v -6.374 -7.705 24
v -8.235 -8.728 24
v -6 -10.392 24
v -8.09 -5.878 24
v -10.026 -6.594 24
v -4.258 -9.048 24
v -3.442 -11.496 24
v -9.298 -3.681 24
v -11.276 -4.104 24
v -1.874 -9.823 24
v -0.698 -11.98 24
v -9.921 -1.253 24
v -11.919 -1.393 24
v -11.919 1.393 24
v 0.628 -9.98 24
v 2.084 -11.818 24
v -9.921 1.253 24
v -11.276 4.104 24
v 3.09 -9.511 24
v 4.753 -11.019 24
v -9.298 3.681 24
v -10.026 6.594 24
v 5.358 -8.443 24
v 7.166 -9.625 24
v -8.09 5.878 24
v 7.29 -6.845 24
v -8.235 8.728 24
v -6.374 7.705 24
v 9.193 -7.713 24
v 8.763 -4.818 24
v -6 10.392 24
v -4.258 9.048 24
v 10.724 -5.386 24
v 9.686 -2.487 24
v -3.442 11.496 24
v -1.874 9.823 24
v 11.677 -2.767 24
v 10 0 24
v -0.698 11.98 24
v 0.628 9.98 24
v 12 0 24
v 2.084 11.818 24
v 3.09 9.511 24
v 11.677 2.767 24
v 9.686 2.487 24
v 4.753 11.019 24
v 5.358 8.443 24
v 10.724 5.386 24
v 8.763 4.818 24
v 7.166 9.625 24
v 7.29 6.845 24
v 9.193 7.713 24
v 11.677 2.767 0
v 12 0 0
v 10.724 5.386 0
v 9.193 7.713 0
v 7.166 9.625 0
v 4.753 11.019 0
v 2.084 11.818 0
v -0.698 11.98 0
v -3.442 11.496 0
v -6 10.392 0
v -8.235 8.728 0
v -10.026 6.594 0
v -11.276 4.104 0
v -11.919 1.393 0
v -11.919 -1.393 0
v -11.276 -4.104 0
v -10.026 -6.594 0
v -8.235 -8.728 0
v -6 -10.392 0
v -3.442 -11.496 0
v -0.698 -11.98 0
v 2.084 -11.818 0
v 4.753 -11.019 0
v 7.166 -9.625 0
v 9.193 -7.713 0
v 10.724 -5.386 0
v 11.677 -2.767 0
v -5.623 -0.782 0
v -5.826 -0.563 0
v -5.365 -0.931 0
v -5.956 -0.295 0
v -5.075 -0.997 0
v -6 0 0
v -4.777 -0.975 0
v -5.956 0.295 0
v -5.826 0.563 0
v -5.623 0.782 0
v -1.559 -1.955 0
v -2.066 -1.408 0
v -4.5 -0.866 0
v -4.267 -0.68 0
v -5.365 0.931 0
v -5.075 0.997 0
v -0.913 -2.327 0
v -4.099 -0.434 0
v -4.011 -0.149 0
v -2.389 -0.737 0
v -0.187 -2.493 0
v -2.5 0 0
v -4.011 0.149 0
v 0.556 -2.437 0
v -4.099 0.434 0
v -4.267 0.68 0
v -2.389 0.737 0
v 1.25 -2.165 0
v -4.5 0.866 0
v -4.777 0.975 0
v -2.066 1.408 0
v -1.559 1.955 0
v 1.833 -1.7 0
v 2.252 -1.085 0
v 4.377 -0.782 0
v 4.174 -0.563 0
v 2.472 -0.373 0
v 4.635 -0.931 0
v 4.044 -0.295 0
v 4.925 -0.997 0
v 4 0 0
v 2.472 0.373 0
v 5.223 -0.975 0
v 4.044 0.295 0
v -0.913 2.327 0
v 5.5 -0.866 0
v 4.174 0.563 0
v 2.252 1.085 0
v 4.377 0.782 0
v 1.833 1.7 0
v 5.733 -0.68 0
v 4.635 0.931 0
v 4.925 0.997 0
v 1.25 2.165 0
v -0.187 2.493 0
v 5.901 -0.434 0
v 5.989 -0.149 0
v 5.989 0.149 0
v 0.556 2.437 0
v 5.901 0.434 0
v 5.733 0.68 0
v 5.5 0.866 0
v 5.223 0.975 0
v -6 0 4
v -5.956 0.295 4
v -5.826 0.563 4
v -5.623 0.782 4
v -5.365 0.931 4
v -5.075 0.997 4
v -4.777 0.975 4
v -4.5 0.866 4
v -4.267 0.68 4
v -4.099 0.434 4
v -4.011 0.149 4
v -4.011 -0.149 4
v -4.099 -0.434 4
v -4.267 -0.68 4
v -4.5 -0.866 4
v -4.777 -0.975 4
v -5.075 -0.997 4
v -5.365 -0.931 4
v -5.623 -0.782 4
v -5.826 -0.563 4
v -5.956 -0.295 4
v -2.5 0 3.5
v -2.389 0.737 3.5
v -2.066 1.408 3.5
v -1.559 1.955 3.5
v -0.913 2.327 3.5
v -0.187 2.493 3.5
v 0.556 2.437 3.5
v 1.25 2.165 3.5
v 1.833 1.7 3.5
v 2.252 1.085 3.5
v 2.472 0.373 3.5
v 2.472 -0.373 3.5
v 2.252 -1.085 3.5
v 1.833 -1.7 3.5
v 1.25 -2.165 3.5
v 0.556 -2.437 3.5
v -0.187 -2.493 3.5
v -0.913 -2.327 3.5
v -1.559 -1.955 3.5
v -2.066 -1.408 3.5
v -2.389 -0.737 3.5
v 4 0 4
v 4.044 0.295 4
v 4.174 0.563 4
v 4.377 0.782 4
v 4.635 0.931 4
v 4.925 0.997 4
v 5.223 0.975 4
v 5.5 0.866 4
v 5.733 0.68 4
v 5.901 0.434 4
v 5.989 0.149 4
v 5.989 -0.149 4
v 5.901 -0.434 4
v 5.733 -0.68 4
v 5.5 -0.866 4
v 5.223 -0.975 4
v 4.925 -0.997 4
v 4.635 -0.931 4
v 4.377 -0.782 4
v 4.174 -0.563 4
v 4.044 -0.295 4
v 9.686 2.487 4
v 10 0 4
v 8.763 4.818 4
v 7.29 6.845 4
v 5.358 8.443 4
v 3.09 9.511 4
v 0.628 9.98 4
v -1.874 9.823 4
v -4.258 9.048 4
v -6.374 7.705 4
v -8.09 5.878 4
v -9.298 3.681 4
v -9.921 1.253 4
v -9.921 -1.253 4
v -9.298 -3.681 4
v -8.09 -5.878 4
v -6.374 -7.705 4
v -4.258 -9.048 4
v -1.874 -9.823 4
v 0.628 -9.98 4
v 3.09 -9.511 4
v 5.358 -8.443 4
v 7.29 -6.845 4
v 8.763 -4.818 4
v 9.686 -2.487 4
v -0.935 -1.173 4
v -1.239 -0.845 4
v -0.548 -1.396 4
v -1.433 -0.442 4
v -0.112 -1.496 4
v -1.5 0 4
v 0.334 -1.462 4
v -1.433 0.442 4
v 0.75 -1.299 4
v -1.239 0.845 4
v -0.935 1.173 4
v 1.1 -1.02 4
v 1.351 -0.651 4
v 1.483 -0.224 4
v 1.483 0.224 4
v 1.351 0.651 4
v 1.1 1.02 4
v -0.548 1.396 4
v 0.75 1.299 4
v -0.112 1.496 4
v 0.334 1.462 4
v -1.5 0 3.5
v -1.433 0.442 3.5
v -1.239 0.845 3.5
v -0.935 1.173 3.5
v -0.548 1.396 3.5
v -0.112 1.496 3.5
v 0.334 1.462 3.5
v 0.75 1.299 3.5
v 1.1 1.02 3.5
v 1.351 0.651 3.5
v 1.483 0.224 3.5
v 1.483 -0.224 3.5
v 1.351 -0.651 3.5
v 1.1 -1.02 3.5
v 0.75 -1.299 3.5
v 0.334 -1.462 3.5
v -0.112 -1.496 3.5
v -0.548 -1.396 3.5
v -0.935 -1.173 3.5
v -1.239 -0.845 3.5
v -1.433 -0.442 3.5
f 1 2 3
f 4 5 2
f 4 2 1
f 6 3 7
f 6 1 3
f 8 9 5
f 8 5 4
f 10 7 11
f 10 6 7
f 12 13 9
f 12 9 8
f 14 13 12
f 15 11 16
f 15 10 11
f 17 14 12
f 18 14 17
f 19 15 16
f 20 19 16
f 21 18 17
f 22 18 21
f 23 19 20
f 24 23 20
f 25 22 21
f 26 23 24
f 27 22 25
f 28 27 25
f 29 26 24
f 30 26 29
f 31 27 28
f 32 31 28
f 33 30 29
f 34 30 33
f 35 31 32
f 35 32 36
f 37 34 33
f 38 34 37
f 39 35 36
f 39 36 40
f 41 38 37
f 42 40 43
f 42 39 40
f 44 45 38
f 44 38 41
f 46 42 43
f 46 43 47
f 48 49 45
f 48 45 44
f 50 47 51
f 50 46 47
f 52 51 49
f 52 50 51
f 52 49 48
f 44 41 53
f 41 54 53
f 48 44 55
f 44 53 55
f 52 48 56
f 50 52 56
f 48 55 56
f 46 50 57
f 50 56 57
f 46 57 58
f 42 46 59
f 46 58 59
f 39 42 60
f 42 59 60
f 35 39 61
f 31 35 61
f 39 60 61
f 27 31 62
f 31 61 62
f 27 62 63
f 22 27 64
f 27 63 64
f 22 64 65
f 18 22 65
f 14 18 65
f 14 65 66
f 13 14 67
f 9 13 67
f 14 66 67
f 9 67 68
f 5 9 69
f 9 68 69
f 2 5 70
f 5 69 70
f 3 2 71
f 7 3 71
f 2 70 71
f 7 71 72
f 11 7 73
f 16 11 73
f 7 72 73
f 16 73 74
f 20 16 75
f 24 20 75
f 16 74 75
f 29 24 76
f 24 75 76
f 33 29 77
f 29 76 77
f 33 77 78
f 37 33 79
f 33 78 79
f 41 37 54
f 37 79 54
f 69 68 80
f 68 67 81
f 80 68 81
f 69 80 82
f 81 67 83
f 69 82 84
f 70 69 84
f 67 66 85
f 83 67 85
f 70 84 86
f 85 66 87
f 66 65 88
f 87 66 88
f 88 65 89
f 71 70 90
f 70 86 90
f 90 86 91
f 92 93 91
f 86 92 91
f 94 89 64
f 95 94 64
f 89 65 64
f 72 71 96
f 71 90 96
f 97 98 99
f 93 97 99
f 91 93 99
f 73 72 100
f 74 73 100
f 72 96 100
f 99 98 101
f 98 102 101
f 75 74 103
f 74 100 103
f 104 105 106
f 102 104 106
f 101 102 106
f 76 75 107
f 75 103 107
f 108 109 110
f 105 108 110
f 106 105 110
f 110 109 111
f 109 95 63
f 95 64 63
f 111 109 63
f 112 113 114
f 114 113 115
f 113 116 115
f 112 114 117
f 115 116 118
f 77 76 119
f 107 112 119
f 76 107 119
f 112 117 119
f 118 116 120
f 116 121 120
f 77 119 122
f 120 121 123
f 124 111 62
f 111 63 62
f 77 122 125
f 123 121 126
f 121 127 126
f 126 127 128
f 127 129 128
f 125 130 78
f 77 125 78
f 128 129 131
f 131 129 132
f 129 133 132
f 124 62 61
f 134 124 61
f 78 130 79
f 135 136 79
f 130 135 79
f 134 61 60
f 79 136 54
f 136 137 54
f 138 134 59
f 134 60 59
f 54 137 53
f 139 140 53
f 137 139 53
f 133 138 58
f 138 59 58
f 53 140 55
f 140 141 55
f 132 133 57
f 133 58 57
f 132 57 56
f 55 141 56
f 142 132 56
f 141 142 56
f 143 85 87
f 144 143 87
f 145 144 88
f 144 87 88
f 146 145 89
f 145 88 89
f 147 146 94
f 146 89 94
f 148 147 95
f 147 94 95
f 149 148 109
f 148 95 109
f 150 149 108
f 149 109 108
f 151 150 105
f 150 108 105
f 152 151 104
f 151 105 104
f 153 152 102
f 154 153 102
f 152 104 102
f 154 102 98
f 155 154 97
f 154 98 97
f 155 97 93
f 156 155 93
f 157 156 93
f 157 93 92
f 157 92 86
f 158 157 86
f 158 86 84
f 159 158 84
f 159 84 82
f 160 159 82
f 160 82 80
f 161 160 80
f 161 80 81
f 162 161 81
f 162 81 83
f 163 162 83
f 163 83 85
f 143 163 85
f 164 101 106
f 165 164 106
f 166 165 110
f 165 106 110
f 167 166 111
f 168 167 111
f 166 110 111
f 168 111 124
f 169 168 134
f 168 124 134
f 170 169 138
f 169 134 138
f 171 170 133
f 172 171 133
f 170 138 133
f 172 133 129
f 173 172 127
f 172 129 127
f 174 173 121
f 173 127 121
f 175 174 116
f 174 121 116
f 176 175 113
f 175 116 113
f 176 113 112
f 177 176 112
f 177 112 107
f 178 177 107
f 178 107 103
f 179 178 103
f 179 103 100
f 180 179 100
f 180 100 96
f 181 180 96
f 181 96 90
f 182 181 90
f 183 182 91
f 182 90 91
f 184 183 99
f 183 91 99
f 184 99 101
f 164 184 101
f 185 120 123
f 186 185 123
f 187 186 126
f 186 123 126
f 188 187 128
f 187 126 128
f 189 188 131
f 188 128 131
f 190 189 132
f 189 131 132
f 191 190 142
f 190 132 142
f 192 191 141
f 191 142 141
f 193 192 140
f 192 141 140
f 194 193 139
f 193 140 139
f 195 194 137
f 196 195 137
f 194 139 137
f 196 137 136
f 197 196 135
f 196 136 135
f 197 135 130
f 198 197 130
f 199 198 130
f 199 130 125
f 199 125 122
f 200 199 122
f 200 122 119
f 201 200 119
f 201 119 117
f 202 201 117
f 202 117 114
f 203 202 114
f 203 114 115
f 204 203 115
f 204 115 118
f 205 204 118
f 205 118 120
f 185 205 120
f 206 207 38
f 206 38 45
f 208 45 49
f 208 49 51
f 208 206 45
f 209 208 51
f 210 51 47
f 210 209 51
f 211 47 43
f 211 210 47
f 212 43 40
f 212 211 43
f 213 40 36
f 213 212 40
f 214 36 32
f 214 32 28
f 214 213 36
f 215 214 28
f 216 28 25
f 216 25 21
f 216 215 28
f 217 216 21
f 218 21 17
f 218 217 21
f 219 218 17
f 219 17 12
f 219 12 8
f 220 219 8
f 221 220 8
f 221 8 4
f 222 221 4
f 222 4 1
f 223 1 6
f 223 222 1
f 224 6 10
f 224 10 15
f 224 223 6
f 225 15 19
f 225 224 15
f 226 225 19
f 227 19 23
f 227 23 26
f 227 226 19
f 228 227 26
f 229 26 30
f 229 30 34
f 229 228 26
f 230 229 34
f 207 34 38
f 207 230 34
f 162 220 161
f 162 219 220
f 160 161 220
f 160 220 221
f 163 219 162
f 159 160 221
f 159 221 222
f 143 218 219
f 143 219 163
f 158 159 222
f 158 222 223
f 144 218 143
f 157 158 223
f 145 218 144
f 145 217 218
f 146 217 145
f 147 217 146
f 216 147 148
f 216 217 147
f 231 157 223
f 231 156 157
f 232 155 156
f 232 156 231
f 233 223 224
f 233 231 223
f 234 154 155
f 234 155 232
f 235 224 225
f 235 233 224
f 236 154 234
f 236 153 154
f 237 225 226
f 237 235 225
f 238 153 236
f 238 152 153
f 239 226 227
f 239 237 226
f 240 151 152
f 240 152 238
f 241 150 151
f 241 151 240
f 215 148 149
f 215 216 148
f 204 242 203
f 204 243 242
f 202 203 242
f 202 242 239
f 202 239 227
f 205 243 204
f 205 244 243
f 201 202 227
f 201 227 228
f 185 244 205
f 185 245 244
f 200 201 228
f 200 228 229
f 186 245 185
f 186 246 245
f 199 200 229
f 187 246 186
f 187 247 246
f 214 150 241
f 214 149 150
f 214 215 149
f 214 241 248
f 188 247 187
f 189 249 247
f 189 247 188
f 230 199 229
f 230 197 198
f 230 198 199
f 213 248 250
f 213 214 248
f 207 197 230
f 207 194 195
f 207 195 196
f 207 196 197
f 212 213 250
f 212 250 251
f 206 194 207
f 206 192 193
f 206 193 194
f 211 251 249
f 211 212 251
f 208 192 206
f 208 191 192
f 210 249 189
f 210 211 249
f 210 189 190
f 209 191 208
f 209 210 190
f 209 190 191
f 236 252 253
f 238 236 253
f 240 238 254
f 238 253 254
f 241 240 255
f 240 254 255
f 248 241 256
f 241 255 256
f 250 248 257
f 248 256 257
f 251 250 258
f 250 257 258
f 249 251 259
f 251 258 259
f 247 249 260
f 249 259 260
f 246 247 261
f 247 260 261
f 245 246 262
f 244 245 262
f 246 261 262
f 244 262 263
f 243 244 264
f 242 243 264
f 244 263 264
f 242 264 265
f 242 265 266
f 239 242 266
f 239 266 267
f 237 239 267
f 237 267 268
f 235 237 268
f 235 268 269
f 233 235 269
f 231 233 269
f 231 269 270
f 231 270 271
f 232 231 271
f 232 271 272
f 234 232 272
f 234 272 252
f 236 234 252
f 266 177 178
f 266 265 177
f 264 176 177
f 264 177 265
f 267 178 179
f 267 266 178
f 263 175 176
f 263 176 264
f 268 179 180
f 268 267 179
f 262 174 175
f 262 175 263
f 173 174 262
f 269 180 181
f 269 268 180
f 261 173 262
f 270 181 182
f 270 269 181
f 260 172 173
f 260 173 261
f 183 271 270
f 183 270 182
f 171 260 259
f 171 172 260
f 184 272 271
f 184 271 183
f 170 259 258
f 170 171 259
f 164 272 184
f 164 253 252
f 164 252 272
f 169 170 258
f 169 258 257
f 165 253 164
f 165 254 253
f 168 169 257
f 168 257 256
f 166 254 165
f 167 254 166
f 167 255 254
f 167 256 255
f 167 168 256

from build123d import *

# Parameters (mm, degrees)
SKETCH_1_R          = 12
EXTRUDE_1_DEPTH     = 4
SKETCH_2_R          = 12
SKETCH_2_R_2        = 10
EXTRUDE_2_DEPTH     = 20
SKETCH_4_R          = 1.5
CUT_EXTRUDE_1_DEPTH = 25
SKETCH_6_R          = 2.5
CUT_EXTRUDE_2_DEPTH = 3.5
SKETCH_7_R          = 1
CUT_EXTRUDE_3_DEPTH = 25


with BuildPart() as part:
    # 스케치1 → 보스-돌출1 (new body)
    with BuildSketch(Plane.XY):
        Circle(SKETCH_1_R)
    extrude(amount=EXTRUDE_1_DEPTH)

    # 스케치2 → 보스-돌출2 (add)
    with BuildSketch(Plane.XY.offset(4)):
        Circle(SKETCH_2_R)
        Circle(SKETCH_2_R_2, mode=Mode.SUBTRACT)
    extrude(amount=EXTRUDE_2_DEPTH)

    # 스케치4 → 컷-돌출1 (cut, through all)
    with BuildSketch(Plane(origin=(0, 0, 0), x_dir=(-1, 0, 0), z_dir=(0, 0, -1))):
        Circle(SKETCH_4_R)
    extrude(amount=-CUT_EXTRUDE_1_DEPTH, mode=Mode.SUBTRACT)

    # 스케치6 → 컷-돌출2 (cut)
    with BuildSketch(Plane(origin=(0, 0, 0), x_dir=(-1, 0, 0), z_dir=(0, 0, -1))):
        Circle(SKETCH_6_R)
    extrude(amount=-CUT_EXTRUDE_2_DEPTH, mode=Mode.SUBTRACT)

    # 스케치7 → 컷-돌출3 (cut, through all)
    with BuildSketch(Plane(origin=(0, 0, 0), x_dir=(-1, 0, 0), z_dir=(0, 0, -1))):
        with Locations((-5, 0)):
            Circle(SKETCH_7_R)
        with Locations((5, 0)):
            Circle(SKETCH_7_R)
    extrude(amount=-CUT_EXTRUDE_3_DEPTH, mode=Mode.SUBTRACT)


solid = part.part
